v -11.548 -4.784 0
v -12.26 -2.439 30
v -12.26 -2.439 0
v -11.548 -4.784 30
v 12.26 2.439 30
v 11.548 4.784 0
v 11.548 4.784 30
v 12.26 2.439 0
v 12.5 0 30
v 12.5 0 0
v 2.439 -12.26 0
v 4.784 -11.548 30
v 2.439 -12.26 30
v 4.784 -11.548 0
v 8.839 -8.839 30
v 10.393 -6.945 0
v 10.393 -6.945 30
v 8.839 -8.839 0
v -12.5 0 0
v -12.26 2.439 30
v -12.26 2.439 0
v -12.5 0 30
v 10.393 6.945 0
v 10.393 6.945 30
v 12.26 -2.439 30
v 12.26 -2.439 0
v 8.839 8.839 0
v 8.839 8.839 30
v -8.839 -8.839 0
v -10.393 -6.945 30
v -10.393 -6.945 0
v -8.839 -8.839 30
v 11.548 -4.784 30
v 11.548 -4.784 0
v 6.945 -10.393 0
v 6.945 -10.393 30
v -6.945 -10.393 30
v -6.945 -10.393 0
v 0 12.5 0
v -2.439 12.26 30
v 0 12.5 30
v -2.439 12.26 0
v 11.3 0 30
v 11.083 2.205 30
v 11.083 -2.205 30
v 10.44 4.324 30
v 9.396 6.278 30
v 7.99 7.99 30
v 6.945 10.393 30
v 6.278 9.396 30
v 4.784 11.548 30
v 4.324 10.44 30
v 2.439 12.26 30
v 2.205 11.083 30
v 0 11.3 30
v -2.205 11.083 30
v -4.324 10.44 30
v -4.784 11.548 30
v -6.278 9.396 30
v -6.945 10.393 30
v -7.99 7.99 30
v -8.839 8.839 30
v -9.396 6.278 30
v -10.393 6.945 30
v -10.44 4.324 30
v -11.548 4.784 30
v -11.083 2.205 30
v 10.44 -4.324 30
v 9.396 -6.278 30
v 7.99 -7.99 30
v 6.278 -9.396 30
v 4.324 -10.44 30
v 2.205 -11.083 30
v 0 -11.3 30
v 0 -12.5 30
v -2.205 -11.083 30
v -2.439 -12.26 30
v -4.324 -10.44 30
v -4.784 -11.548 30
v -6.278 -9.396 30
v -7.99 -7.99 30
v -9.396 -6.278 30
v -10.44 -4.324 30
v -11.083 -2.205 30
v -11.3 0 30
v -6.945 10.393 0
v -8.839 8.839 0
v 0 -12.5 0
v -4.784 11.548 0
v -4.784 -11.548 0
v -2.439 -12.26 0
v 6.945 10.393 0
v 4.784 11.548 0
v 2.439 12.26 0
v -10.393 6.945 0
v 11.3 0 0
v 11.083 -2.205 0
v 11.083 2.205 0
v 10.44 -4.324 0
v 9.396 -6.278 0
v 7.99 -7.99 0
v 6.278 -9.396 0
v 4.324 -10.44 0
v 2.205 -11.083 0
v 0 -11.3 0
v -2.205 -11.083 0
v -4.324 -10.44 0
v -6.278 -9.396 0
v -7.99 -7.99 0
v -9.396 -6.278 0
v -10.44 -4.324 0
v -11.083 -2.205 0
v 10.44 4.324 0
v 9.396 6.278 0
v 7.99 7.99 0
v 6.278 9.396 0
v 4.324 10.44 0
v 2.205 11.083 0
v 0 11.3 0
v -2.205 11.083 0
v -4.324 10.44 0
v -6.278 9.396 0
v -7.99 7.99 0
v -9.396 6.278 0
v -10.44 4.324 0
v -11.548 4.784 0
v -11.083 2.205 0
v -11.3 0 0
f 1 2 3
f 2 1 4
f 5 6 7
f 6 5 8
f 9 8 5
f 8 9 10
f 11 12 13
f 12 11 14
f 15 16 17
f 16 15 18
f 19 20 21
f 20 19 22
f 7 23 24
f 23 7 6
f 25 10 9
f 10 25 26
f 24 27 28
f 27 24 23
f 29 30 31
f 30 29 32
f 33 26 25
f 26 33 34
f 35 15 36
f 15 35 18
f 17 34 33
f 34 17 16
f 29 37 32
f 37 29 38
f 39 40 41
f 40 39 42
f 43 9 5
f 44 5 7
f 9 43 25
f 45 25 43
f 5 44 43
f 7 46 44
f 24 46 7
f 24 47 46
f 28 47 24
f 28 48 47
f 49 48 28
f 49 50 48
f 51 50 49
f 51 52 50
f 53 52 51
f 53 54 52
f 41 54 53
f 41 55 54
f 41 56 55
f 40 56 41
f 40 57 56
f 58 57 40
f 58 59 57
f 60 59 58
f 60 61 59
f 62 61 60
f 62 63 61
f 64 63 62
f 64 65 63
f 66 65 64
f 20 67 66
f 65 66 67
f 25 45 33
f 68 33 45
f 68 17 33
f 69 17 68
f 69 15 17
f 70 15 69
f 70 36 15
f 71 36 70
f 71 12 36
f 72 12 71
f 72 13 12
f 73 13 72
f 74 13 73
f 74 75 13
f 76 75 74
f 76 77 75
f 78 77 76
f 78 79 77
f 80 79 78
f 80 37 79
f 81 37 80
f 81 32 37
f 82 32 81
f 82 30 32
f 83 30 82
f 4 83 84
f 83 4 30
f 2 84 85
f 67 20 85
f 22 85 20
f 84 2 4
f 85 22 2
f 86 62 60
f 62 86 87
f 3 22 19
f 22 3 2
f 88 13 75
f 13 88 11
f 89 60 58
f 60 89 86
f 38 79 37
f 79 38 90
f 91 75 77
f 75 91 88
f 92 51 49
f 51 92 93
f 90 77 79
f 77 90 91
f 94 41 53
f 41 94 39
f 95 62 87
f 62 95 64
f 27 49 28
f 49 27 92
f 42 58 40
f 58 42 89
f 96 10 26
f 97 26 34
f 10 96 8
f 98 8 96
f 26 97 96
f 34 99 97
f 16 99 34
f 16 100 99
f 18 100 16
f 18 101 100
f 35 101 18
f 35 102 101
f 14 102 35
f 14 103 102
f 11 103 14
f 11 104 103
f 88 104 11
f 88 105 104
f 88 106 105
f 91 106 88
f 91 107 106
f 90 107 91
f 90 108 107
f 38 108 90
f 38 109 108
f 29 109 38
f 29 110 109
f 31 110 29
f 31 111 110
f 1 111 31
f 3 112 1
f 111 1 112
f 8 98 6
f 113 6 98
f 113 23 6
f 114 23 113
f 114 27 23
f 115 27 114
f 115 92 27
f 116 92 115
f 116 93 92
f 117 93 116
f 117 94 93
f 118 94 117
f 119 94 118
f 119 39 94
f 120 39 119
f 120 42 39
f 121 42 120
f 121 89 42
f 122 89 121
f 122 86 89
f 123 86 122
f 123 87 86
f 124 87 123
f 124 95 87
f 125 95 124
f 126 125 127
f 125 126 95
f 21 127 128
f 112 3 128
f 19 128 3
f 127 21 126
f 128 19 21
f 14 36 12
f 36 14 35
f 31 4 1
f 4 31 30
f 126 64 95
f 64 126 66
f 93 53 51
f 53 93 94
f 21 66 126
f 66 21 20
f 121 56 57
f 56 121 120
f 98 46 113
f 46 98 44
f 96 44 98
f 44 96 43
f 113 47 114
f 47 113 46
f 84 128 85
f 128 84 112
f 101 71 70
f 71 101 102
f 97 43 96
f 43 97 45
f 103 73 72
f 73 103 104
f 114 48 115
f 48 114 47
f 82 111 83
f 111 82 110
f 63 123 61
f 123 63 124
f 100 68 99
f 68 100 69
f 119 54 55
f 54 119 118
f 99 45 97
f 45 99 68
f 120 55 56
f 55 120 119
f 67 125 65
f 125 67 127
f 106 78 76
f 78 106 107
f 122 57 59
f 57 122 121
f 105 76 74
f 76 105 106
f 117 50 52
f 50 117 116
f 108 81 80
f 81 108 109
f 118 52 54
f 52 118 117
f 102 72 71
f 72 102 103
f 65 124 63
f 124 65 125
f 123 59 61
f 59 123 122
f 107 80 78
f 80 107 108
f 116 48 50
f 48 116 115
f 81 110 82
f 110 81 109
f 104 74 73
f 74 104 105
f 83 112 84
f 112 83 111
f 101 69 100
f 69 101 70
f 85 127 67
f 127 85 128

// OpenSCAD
$fn = 32;

// ----------------------------------------------------------------------
// Thin tube: 1.2 mm wall
// ----------------------------------------------------------------------

// --- parameters (mm) ---
tube_od = 25;             // outer diameter
tube_h = 30;              // height, Z
wall = 1.2;               // wall thickness
fit_tol = 0.1;            // tolerance for press fits, mm
free_tol = 0.3;           // tolerance for clearance fits, mm

difference() {
  cylinder(h = tube_h, d = tube_od);
  translate([0, 0, -1]) cylinder(h = tube_h + 2, d = tube_od - 2 * wall);
}
